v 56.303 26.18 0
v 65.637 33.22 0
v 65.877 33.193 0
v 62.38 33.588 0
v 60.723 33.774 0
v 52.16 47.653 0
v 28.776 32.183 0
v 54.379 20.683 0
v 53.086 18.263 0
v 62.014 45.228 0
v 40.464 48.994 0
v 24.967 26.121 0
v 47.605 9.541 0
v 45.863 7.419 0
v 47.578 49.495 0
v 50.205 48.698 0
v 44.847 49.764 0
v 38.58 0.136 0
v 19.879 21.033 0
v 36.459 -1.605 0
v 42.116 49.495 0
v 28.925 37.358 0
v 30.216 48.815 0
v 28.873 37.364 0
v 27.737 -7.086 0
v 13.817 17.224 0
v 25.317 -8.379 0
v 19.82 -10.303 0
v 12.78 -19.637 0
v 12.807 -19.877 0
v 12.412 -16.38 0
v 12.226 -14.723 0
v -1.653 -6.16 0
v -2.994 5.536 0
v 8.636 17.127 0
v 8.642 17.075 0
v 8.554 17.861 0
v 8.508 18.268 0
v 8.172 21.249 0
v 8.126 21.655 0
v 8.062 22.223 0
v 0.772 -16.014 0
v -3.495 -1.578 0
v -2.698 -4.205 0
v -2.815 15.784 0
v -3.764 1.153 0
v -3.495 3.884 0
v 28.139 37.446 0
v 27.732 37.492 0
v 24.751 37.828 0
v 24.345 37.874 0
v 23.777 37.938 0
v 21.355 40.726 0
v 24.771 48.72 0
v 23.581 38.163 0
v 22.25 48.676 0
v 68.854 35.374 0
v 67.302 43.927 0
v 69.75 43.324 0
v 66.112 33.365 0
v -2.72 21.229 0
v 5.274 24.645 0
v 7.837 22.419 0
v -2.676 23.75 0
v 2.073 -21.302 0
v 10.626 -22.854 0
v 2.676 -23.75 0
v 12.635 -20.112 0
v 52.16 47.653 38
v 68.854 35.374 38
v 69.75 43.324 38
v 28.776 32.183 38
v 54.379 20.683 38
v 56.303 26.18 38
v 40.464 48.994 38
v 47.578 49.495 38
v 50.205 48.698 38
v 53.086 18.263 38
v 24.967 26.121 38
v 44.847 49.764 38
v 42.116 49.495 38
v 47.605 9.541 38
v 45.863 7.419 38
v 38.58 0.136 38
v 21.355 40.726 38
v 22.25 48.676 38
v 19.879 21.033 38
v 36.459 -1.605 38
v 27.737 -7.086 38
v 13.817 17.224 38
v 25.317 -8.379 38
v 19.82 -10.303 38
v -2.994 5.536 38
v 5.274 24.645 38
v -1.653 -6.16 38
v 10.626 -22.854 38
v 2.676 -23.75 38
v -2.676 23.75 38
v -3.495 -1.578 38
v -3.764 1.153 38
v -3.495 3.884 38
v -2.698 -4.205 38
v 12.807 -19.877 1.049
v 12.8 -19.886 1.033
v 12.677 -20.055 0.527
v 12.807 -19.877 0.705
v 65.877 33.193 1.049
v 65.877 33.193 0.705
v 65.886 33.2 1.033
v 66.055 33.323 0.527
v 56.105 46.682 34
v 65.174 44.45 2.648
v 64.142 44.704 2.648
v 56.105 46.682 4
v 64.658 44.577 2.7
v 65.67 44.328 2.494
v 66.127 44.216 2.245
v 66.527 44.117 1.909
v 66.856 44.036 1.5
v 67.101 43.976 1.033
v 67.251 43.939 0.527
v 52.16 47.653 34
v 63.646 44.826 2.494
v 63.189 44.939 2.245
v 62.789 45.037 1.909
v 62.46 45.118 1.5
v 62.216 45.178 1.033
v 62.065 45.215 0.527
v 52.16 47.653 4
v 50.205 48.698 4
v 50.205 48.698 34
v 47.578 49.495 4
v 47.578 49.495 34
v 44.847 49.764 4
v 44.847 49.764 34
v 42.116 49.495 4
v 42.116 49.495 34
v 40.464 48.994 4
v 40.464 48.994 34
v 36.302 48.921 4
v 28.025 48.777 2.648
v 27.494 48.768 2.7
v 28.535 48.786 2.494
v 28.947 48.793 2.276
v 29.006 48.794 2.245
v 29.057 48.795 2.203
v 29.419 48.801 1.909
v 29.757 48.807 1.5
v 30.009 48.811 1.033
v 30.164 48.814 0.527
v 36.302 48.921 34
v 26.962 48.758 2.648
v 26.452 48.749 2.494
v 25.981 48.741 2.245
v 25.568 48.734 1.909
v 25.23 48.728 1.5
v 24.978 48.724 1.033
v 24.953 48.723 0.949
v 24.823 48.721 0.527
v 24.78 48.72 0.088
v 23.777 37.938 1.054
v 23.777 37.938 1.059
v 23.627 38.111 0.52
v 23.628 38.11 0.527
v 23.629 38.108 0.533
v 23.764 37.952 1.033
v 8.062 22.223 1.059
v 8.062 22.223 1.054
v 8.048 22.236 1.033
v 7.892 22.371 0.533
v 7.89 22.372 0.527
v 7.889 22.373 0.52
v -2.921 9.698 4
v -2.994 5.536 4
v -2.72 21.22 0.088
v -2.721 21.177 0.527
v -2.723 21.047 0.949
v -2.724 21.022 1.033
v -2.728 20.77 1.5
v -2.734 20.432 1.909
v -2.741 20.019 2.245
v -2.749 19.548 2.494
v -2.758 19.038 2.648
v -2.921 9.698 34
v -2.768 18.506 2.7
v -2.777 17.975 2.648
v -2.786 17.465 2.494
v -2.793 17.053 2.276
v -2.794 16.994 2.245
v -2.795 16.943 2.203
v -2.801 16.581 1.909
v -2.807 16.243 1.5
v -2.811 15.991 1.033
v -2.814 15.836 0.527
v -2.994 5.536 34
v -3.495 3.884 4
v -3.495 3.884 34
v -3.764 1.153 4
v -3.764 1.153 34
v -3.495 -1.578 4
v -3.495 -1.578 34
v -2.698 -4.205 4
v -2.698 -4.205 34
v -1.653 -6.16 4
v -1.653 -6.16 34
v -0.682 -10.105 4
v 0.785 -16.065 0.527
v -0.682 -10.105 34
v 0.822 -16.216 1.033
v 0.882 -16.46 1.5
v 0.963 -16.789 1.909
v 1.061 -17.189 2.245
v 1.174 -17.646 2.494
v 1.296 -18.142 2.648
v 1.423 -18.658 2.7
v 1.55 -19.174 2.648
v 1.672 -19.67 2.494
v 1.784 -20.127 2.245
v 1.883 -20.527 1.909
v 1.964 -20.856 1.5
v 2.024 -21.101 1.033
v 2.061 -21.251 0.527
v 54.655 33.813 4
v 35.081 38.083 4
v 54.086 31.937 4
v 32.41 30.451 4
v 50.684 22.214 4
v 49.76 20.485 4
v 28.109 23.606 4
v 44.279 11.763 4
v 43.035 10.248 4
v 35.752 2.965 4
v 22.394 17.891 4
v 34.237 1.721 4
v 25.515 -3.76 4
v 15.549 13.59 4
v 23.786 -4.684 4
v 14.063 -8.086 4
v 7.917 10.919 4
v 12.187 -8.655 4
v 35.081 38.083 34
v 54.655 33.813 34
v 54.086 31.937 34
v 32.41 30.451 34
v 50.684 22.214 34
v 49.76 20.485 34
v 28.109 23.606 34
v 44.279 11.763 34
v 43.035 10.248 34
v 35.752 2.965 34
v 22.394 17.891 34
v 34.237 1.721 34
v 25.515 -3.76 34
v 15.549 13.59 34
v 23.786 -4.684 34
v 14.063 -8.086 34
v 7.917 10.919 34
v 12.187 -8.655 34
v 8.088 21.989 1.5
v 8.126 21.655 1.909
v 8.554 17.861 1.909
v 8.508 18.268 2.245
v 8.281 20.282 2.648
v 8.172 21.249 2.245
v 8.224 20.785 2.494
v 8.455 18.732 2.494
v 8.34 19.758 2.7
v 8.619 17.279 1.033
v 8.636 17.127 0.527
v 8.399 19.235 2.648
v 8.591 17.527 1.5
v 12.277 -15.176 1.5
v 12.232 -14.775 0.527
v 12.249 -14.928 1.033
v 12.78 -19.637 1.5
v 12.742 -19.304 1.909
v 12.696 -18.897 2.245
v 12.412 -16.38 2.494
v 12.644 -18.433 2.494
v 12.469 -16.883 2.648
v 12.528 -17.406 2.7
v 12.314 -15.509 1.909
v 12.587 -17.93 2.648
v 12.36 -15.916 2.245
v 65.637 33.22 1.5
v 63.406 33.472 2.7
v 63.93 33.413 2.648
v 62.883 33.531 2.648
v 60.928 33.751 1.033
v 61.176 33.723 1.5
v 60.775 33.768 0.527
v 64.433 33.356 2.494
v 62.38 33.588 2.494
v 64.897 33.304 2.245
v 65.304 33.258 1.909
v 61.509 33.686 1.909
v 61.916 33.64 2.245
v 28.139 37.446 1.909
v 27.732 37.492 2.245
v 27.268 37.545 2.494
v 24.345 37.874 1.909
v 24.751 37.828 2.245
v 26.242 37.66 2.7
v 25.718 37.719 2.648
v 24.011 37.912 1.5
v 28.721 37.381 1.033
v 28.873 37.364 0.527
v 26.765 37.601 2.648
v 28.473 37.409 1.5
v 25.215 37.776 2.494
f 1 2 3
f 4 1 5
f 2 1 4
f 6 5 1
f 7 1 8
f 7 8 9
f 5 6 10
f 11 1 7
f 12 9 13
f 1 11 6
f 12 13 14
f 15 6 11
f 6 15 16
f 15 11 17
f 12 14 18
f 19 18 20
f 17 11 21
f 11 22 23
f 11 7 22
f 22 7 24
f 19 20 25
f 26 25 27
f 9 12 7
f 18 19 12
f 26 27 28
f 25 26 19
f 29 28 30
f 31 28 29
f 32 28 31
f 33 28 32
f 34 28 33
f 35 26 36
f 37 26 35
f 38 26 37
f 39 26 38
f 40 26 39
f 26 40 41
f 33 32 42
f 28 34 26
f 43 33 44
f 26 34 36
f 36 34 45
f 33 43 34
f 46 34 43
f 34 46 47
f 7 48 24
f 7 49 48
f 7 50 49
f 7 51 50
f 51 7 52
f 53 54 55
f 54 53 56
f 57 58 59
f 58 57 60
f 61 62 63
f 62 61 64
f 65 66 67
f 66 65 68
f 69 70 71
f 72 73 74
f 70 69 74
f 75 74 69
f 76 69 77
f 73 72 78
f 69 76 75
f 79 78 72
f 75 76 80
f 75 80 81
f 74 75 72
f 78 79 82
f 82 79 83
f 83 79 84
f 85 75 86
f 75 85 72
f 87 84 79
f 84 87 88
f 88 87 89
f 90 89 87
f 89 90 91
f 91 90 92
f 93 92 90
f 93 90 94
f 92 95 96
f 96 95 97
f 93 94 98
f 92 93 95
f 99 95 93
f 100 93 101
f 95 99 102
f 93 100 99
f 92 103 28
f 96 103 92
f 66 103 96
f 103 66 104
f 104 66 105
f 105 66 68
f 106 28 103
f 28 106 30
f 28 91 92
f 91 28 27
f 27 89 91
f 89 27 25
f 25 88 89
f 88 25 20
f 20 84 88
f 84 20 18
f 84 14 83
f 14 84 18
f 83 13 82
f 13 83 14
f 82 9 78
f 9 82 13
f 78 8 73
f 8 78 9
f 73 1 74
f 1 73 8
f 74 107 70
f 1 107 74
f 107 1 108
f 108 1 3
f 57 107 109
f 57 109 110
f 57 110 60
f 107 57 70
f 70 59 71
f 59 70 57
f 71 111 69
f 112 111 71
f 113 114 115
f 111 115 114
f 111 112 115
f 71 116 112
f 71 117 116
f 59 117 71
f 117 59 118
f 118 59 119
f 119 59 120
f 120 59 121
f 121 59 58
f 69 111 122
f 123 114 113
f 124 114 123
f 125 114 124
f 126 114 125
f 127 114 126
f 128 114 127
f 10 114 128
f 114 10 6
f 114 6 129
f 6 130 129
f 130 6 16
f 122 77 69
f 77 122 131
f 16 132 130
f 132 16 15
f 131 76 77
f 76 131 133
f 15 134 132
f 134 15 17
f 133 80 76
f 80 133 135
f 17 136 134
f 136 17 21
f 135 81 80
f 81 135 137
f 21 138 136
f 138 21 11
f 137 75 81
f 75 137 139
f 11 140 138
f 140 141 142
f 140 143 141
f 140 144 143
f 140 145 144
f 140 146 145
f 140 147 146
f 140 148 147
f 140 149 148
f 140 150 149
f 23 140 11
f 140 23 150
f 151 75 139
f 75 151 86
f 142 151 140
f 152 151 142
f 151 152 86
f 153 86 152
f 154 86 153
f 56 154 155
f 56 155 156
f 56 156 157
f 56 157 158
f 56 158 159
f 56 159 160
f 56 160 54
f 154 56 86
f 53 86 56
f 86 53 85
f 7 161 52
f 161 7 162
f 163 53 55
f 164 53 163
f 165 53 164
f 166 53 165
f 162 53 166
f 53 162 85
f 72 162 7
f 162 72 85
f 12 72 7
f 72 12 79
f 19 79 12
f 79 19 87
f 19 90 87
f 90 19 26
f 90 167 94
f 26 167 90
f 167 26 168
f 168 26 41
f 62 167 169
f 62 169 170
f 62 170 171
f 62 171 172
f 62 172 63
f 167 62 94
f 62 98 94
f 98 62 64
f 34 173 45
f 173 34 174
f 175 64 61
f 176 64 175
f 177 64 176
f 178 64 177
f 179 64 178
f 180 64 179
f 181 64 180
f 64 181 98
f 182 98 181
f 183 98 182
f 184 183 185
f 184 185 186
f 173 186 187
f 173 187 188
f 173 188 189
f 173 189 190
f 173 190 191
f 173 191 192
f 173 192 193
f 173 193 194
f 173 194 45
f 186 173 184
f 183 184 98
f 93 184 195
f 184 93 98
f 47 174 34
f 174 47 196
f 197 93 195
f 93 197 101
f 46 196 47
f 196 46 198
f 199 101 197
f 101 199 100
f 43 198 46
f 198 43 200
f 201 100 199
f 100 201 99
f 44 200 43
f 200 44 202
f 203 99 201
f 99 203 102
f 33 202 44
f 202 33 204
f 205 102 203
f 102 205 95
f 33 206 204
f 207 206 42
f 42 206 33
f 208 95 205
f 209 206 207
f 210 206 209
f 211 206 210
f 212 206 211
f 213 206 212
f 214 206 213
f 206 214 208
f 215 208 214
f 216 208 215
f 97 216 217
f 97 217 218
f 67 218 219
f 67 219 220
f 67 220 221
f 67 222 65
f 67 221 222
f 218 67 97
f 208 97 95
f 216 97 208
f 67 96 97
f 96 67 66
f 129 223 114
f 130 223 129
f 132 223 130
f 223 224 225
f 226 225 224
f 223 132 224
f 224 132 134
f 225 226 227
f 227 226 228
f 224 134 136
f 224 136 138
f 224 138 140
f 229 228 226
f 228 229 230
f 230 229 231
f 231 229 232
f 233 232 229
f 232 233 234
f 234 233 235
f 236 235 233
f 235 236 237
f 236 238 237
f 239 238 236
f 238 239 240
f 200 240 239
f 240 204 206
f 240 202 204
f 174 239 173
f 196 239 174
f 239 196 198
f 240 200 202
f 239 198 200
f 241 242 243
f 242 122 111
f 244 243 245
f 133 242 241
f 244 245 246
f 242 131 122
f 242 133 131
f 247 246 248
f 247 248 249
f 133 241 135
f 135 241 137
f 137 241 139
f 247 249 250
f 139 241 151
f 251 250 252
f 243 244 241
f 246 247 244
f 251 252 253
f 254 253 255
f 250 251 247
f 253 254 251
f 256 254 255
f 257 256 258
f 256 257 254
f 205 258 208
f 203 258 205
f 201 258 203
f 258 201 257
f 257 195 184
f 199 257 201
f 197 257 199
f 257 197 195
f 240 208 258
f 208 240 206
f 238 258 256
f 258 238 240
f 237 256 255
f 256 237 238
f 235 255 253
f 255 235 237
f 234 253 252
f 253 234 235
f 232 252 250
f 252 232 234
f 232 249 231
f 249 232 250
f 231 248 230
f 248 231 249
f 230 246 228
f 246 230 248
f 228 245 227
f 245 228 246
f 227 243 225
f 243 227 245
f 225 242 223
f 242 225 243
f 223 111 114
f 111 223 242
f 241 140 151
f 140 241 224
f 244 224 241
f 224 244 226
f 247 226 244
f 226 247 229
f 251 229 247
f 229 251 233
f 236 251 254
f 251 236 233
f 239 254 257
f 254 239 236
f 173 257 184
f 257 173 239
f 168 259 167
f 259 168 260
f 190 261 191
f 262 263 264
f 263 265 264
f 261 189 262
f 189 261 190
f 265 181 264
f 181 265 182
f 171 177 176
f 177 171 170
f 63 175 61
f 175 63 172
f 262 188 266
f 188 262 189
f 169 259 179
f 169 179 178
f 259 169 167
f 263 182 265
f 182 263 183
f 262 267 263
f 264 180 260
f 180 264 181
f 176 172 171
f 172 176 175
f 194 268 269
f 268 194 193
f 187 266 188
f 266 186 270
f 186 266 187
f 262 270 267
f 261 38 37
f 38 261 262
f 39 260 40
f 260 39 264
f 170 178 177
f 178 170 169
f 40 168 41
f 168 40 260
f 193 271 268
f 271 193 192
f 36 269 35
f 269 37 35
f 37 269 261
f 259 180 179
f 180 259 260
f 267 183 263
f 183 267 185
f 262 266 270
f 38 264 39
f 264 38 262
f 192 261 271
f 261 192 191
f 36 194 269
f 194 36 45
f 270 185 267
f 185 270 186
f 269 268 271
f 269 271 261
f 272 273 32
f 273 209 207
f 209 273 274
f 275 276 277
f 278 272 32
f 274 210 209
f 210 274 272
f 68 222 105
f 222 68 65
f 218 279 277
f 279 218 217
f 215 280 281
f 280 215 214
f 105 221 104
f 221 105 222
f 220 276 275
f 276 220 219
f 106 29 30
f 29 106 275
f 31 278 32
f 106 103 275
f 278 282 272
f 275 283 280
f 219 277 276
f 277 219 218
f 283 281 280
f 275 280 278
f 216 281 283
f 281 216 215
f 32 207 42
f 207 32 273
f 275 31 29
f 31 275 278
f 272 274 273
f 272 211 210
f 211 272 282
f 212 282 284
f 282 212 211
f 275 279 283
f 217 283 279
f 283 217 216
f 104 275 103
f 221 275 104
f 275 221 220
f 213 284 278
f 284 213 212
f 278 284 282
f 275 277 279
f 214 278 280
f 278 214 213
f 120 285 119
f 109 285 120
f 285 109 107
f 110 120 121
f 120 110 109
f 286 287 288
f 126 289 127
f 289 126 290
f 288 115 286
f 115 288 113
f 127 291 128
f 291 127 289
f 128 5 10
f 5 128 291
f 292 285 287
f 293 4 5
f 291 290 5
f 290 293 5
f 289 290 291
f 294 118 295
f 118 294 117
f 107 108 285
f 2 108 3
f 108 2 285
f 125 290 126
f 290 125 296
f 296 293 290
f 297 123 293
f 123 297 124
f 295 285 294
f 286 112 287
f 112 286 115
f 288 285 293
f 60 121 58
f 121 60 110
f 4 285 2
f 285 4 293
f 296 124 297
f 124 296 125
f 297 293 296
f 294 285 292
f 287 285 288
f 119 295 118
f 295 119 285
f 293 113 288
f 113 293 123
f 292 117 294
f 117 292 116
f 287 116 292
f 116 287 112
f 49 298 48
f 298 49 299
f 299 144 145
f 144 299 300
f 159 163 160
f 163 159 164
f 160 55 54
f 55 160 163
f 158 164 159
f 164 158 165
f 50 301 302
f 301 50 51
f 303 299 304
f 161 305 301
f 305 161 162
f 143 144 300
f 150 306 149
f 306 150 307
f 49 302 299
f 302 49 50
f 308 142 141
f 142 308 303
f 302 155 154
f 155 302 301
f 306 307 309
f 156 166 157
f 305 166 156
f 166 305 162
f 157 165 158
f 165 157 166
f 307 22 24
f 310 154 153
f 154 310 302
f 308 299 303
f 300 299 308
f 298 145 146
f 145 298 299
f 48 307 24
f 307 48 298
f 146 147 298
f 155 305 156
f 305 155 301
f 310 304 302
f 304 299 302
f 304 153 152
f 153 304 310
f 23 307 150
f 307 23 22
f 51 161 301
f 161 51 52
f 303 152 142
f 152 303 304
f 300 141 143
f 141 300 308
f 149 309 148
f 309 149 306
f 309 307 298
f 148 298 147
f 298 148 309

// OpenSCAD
$fn = 32;

// ----------------------------------------------------------------------
// Air duct: 28 mm duct, 4 mm wall, 38 mm across
// ----------------------------------------------------------------------

// --- parameters (mm) ---
duct_r = 14;              // duct core radius
duct_d = 28;              // duct core diameter
wall = 4;                 // duct wall thickness
height = 38;              // duct width (extrusion height)
port_r = 23.9;            // port flange half width
port_d = 47.8;            // port flange width
port_t = 8;               // port flange thickness
bolt_d = 5.4;             // port bolt holes
bolt_offset = 18.7;       // bolt hole offset from the port axis

difference() {
  /* outer hull chain: tube with a flat flange plate at every port */
  linear_extrude(height = 38) {
    hull() {
      polygon([[2.676, -23.75], [-2.676, 23.75], [5.274, 24.645], [10.626, -22.854]]);
      translate([10.931, 1.232]) circle(r = 14);
    }
    hull() {
      translate([10.931, 1.232]) circle(r = 14);
      translate([10.236, 1.153]) circle(r = 14);
    }
    hull() {
      translate([10.236, 1.153]) circle(r = 14);
      translate([19.959, 4.555]) circle(r = 14);
    }
    hull() {
      translate([19.959, 4.555]) circle(r = 14);
      translate([28.681, 10.036]) circle(r = 14);
    }
    hull() {
      translate([28.681, 10.036]) circle(r = 14);
      translate([35.964, 17.319]) circle(r = 14);
    }
    hull() {
      translate([35.964, 17.319]) circle(r = 14);
      translate([41.445, 26.041]) circle(r = 14);
    }
    hull() {
      translate([41.445, 26.041]) circle(r = 14);
      translate([44.847, 35.764]) circle(r = 14);
    }
    hull() {
      translate([44.847, 35.764]) circle(r = 14);
      translate([44.768, 35.069]) circle(r = 14);
    }
    hull() {
      translate([44.768, 35.069]) circle(r = 14);
      polygon([[22.25, 48.676], [69.75, 43.324], [68.854, 35.374], [21.355, 40.726]]);
    }
  }
  /* air passage: the same chain inset by the wall, 5 mm proud of the ports */
  translate([0, 0, 4]) linear_extrude(height = 30) {
    hull() {
      translate([-4.969, -0.56]) circle(r = 10);
      translate([10.236, 1.153]) circle(r = 10);
    }
    hull() {
      translate([10.236, 1.153]) circle(r = 10);
      translate([19.959, 4.555]) circle(r = 10);
    }
    hull() {
      translate([19.959, 4.555]) circle(r = 10);
      translate([28.681, 10.036]) circle(r = 10);
    }
    hull() {
      translate([28.681, 10.036]) circle(r = 10);
      translate([35.964, 17.319]) circle(r = 10);
    }
    hull() {
      translate([35.964, 17.319]) circle(r = 10);
      translate([41.445, 26.041]) circle(r = 10);
    }
    hull() {
      translate([41.445, 26.041]) circle(r = 10);
      translate([44.847, 35.764]) circle(r = 10);
    }
    hull() {
      translate([44.847, 35.764]) circle(r = 10);
      translate([46.56, 50.969]) circle(r = 10);
    }
  }
  translate([0, 0]) rotate([0, 0, -83.57]) translate([-18.7, -2.5]) rotate([-90, 0, 0]) cylinder(h = 13, d = 5.4);
  translate([0, 0]) rotate([0, 0, -83.57]) translate([18.7, -2.5]) rotate([-90, 0, 0]) cylinder(h = 13, d = 5.4);
  translate([46, 46]) rotate([0, 0, 173.57]) translate([-18.7, -2.5]) rotate([-90, 0, 0]) cylinder(h = 13, d = 5.4);
  translate([46, 46]) rotate([0, 0, 173.57]) translate([18.7, -2.5]) rotate([-90, 0, 0]) cylinder(h = 13, d = 5.4);
}
